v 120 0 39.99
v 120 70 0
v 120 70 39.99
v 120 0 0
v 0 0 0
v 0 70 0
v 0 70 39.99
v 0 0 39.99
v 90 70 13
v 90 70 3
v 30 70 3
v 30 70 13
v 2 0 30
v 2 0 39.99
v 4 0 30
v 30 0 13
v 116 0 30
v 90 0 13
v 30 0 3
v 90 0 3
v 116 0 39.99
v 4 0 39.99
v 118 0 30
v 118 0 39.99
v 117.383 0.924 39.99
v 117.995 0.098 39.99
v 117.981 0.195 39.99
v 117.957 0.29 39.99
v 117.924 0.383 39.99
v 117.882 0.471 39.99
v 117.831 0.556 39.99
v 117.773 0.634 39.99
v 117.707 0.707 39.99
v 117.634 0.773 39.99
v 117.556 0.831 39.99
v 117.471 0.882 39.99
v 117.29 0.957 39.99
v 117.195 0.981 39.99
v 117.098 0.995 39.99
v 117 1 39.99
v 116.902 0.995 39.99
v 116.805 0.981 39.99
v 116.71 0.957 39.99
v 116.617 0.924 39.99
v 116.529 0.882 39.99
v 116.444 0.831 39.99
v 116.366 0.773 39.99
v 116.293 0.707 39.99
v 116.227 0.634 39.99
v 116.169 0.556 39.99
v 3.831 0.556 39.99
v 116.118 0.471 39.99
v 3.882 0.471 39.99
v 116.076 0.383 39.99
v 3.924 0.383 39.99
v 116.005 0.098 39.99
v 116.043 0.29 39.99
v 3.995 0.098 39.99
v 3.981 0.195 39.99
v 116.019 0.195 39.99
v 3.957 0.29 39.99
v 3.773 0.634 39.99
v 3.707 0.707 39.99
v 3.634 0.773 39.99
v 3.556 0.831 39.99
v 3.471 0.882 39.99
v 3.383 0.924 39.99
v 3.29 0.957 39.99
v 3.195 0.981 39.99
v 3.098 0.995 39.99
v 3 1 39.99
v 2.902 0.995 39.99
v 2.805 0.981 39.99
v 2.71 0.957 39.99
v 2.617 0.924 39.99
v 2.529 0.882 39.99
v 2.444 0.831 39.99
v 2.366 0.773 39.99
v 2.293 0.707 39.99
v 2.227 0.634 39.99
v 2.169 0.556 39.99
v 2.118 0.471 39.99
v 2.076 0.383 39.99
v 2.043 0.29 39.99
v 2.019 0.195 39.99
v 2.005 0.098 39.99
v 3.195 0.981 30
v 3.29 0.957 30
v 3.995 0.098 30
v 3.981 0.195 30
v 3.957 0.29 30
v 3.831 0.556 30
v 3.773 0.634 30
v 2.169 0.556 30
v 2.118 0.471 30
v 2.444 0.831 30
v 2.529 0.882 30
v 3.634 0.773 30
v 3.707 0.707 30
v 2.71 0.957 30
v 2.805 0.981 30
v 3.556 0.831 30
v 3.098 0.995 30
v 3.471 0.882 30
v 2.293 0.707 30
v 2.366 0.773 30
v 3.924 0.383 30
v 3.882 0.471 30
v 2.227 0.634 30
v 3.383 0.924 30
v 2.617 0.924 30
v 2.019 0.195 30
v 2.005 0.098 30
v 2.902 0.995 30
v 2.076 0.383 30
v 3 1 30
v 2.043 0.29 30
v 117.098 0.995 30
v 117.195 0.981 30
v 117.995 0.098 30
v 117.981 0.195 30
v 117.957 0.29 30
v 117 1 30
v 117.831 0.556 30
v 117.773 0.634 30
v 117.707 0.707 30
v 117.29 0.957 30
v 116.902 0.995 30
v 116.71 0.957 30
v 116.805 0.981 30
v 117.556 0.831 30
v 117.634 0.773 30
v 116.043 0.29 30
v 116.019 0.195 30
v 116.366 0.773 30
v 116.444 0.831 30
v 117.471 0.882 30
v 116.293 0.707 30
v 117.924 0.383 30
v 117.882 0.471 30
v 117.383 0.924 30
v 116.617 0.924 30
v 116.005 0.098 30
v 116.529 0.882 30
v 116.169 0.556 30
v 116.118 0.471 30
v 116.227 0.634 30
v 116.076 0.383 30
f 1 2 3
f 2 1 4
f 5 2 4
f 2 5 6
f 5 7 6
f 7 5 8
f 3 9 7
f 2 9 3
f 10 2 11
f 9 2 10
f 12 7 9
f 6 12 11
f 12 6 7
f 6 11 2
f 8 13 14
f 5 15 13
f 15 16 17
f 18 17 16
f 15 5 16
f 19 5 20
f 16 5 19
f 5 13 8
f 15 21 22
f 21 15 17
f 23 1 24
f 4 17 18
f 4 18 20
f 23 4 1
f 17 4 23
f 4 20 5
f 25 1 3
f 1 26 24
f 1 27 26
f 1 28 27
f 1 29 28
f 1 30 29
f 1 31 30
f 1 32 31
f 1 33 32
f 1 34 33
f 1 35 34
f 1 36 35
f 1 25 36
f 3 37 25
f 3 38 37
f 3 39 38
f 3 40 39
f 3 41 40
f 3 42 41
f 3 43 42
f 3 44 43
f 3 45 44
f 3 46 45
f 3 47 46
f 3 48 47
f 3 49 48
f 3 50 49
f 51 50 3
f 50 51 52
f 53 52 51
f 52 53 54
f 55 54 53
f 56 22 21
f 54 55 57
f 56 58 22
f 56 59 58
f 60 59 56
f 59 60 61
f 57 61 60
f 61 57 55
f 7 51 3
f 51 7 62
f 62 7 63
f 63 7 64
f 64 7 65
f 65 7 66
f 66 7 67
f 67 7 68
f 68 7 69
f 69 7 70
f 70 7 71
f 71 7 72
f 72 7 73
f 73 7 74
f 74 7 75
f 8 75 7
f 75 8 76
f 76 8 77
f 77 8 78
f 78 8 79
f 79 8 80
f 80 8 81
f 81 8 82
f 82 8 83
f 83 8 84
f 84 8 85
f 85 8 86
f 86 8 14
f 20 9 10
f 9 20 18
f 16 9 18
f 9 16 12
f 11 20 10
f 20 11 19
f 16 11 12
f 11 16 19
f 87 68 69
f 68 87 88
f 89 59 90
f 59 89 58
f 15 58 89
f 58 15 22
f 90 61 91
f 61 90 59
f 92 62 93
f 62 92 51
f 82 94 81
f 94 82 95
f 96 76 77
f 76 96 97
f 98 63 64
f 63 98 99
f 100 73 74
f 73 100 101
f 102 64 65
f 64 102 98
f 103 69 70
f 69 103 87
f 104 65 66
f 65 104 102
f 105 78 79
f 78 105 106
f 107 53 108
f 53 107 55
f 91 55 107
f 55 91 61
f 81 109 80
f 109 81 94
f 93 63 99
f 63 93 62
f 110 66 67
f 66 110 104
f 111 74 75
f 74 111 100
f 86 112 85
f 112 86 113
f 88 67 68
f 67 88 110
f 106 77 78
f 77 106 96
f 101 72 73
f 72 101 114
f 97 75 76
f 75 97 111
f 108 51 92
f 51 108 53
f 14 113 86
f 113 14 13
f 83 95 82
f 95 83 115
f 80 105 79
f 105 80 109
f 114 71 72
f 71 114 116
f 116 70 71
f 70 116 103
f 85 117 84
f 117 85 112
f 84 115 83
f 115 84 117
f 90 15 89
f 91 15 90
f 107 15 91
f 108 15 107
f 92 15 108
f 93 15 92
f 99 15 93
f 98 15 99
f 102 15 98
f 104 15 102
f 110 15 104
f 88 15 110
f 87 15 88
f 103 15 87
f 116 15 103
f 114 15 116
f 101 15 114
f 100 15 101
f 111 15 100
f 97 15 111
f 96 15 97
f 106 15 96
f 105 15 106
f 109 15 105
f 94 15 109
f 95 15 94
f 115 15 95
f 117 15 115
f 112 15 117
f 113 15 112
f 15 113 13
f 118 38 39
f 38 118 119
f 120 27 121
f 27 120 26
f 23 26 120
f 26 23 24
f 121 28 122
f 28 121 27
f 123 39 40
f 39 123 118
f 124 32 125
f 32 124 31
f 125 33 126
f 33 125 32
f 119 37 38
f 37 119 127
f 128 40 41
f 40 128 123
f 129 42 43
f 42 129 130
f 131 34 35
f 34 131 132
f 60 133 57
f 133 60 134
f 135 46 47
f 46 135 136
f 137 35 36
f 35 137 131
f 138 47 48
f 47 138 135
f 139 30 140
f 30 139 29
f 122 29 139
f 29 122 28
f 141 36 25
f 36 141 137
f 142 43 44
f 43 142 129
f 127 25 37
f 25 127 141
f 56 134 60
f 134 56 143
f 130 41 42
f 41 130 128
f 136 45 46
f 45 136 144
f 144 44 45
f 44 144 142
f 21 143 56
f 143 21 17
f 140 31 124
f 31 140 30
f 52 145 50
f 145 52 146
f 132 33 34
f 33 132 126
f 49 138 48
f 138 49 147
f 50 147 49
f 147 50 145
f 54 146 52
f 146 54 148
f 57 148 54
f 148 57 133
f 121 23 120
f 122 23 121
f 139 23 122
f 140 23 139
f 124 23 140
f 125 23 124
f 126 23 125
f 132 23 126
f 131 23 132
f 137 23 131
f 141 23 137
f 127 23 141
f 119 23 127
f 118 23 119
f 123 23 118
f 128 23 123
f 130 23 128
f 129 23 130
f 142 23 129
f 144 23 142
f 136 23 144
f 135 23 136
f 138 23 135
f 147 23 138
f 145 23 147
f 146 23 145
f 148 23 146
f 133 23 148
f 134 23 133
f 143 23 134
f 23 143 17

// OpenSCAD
// Buffer Tank for Mini Horizontal Gel Electrophoresis
// Units: millimetres

// Outer Dimensions
$outer_width_x = 120; // X
$outer_width_y = 70;  // Y
$outer_height_z = 40; // Z

// Wall and Floor Thickness
$wall_thickness = 3;
$floor_thickness = 3;

// Platform Dimensions
$platform_length_x = 60; // Length in X (centred)
$platform_width_y = $outer_width_y; // Spans full outer width (Y)
$platform_height_rel_inner = 10; // Height above inner floor

// Electrode Hole Dimensions
$hole_diameter = 2;
$hole_y_pos = 0;
$hole_z_pos = 30;

// Quality Settings
$fn = 64;

// Calculate Inner Dimensions
$inner_width_x = $outer_width_x - 2 * $wall_thickness;
$inner_width_y = $outer_width_y - 2 * $wall_thickness;
$inner_height_z = $outer_height_z - $floor_thickness - $wall_thickness;

// Calculate Platform Top Z
// Inner floor is at Z = $floor_thickness
// Platform top is at Z = $floor_thickness + $platform_height_rel_inner
$platform_top_z = $floor_thickness + $platform_height_rel_inner;

// Start modeling
difference() {
    // 1. Main Tank Body (Open Top)
    // Outer box minus top face
    cube([
        $outer_width_x, 
        $outer_width_y, 
        $outer_height_z
    ], center = false);
    
    // Cut open top (extend slightly past top face)
    translate([0, 0, $outer_height_z - 0.01]) {
        cube([
            $outer_width_x, 
            $outer_width_y, 
            0.02
        ]);
    }

    // 2. Internal Platform
    // Position: Centred in X, Full Width in Y, Sitting on inner floor
    // The platform spans the FULL width (Y) of the tank.
    // Since the tank is 70mm wide and the platform is 70mm wide, it spans the entire outer width.
    // Center X: 120 / 2 = 60. Length 60 -> X range [30, 90].
    // Center Y: 70 / 2 = 35. Width 70 -> Y range [0, 70].
    // Base Z: $floor_thickness (3). Height 10 -> Top Z = 13.
    translate([
        ($outer_width_x / 2) - ($platform_length_x / 2), 
        ($outer_width_y / 2) - ($platform_width_y / 2), 
        $floor_thickness
    ]) {
        // Platform is a solid block
        cube([
            $platform_length_x, 
            $platform_width_y, 
            $platform_height_rel_inner
        ]);
    }

    // 3. Electrode Holes
    // Two holes: Left and Right ends of the tank.
    // Hole center X: 
    // Left Wall X center: $wall_thickness (3)
    // Right Wall X center: $outer_width_x - $wall_thickness (117)
    // Hole center Y: $hole_y_pos (0)
    // Hole center Z: $hole_z_pos (30)
    // Hole Radius
    $hole_radius = $hole_diameter / 2;
    
    // Left Hole
    translate([
        $wall_thickness, 
        $hole_y_pos, 
        $hole_z_pos
    ]) {
        cylinder(
            h = $outer_height_z, 
            r = $hole_radius, 
            center = false
        );
    }
    
    // Right Hole
    translate([
        $outer_width_x - $wall_thickness, 
        $hole_y_pos, 
        $hole_z_pos
    ]) {
        cylinder(
            h = $outer_height_z, 
            r = $hole_radius, 
            center = false
        );
    }
}
